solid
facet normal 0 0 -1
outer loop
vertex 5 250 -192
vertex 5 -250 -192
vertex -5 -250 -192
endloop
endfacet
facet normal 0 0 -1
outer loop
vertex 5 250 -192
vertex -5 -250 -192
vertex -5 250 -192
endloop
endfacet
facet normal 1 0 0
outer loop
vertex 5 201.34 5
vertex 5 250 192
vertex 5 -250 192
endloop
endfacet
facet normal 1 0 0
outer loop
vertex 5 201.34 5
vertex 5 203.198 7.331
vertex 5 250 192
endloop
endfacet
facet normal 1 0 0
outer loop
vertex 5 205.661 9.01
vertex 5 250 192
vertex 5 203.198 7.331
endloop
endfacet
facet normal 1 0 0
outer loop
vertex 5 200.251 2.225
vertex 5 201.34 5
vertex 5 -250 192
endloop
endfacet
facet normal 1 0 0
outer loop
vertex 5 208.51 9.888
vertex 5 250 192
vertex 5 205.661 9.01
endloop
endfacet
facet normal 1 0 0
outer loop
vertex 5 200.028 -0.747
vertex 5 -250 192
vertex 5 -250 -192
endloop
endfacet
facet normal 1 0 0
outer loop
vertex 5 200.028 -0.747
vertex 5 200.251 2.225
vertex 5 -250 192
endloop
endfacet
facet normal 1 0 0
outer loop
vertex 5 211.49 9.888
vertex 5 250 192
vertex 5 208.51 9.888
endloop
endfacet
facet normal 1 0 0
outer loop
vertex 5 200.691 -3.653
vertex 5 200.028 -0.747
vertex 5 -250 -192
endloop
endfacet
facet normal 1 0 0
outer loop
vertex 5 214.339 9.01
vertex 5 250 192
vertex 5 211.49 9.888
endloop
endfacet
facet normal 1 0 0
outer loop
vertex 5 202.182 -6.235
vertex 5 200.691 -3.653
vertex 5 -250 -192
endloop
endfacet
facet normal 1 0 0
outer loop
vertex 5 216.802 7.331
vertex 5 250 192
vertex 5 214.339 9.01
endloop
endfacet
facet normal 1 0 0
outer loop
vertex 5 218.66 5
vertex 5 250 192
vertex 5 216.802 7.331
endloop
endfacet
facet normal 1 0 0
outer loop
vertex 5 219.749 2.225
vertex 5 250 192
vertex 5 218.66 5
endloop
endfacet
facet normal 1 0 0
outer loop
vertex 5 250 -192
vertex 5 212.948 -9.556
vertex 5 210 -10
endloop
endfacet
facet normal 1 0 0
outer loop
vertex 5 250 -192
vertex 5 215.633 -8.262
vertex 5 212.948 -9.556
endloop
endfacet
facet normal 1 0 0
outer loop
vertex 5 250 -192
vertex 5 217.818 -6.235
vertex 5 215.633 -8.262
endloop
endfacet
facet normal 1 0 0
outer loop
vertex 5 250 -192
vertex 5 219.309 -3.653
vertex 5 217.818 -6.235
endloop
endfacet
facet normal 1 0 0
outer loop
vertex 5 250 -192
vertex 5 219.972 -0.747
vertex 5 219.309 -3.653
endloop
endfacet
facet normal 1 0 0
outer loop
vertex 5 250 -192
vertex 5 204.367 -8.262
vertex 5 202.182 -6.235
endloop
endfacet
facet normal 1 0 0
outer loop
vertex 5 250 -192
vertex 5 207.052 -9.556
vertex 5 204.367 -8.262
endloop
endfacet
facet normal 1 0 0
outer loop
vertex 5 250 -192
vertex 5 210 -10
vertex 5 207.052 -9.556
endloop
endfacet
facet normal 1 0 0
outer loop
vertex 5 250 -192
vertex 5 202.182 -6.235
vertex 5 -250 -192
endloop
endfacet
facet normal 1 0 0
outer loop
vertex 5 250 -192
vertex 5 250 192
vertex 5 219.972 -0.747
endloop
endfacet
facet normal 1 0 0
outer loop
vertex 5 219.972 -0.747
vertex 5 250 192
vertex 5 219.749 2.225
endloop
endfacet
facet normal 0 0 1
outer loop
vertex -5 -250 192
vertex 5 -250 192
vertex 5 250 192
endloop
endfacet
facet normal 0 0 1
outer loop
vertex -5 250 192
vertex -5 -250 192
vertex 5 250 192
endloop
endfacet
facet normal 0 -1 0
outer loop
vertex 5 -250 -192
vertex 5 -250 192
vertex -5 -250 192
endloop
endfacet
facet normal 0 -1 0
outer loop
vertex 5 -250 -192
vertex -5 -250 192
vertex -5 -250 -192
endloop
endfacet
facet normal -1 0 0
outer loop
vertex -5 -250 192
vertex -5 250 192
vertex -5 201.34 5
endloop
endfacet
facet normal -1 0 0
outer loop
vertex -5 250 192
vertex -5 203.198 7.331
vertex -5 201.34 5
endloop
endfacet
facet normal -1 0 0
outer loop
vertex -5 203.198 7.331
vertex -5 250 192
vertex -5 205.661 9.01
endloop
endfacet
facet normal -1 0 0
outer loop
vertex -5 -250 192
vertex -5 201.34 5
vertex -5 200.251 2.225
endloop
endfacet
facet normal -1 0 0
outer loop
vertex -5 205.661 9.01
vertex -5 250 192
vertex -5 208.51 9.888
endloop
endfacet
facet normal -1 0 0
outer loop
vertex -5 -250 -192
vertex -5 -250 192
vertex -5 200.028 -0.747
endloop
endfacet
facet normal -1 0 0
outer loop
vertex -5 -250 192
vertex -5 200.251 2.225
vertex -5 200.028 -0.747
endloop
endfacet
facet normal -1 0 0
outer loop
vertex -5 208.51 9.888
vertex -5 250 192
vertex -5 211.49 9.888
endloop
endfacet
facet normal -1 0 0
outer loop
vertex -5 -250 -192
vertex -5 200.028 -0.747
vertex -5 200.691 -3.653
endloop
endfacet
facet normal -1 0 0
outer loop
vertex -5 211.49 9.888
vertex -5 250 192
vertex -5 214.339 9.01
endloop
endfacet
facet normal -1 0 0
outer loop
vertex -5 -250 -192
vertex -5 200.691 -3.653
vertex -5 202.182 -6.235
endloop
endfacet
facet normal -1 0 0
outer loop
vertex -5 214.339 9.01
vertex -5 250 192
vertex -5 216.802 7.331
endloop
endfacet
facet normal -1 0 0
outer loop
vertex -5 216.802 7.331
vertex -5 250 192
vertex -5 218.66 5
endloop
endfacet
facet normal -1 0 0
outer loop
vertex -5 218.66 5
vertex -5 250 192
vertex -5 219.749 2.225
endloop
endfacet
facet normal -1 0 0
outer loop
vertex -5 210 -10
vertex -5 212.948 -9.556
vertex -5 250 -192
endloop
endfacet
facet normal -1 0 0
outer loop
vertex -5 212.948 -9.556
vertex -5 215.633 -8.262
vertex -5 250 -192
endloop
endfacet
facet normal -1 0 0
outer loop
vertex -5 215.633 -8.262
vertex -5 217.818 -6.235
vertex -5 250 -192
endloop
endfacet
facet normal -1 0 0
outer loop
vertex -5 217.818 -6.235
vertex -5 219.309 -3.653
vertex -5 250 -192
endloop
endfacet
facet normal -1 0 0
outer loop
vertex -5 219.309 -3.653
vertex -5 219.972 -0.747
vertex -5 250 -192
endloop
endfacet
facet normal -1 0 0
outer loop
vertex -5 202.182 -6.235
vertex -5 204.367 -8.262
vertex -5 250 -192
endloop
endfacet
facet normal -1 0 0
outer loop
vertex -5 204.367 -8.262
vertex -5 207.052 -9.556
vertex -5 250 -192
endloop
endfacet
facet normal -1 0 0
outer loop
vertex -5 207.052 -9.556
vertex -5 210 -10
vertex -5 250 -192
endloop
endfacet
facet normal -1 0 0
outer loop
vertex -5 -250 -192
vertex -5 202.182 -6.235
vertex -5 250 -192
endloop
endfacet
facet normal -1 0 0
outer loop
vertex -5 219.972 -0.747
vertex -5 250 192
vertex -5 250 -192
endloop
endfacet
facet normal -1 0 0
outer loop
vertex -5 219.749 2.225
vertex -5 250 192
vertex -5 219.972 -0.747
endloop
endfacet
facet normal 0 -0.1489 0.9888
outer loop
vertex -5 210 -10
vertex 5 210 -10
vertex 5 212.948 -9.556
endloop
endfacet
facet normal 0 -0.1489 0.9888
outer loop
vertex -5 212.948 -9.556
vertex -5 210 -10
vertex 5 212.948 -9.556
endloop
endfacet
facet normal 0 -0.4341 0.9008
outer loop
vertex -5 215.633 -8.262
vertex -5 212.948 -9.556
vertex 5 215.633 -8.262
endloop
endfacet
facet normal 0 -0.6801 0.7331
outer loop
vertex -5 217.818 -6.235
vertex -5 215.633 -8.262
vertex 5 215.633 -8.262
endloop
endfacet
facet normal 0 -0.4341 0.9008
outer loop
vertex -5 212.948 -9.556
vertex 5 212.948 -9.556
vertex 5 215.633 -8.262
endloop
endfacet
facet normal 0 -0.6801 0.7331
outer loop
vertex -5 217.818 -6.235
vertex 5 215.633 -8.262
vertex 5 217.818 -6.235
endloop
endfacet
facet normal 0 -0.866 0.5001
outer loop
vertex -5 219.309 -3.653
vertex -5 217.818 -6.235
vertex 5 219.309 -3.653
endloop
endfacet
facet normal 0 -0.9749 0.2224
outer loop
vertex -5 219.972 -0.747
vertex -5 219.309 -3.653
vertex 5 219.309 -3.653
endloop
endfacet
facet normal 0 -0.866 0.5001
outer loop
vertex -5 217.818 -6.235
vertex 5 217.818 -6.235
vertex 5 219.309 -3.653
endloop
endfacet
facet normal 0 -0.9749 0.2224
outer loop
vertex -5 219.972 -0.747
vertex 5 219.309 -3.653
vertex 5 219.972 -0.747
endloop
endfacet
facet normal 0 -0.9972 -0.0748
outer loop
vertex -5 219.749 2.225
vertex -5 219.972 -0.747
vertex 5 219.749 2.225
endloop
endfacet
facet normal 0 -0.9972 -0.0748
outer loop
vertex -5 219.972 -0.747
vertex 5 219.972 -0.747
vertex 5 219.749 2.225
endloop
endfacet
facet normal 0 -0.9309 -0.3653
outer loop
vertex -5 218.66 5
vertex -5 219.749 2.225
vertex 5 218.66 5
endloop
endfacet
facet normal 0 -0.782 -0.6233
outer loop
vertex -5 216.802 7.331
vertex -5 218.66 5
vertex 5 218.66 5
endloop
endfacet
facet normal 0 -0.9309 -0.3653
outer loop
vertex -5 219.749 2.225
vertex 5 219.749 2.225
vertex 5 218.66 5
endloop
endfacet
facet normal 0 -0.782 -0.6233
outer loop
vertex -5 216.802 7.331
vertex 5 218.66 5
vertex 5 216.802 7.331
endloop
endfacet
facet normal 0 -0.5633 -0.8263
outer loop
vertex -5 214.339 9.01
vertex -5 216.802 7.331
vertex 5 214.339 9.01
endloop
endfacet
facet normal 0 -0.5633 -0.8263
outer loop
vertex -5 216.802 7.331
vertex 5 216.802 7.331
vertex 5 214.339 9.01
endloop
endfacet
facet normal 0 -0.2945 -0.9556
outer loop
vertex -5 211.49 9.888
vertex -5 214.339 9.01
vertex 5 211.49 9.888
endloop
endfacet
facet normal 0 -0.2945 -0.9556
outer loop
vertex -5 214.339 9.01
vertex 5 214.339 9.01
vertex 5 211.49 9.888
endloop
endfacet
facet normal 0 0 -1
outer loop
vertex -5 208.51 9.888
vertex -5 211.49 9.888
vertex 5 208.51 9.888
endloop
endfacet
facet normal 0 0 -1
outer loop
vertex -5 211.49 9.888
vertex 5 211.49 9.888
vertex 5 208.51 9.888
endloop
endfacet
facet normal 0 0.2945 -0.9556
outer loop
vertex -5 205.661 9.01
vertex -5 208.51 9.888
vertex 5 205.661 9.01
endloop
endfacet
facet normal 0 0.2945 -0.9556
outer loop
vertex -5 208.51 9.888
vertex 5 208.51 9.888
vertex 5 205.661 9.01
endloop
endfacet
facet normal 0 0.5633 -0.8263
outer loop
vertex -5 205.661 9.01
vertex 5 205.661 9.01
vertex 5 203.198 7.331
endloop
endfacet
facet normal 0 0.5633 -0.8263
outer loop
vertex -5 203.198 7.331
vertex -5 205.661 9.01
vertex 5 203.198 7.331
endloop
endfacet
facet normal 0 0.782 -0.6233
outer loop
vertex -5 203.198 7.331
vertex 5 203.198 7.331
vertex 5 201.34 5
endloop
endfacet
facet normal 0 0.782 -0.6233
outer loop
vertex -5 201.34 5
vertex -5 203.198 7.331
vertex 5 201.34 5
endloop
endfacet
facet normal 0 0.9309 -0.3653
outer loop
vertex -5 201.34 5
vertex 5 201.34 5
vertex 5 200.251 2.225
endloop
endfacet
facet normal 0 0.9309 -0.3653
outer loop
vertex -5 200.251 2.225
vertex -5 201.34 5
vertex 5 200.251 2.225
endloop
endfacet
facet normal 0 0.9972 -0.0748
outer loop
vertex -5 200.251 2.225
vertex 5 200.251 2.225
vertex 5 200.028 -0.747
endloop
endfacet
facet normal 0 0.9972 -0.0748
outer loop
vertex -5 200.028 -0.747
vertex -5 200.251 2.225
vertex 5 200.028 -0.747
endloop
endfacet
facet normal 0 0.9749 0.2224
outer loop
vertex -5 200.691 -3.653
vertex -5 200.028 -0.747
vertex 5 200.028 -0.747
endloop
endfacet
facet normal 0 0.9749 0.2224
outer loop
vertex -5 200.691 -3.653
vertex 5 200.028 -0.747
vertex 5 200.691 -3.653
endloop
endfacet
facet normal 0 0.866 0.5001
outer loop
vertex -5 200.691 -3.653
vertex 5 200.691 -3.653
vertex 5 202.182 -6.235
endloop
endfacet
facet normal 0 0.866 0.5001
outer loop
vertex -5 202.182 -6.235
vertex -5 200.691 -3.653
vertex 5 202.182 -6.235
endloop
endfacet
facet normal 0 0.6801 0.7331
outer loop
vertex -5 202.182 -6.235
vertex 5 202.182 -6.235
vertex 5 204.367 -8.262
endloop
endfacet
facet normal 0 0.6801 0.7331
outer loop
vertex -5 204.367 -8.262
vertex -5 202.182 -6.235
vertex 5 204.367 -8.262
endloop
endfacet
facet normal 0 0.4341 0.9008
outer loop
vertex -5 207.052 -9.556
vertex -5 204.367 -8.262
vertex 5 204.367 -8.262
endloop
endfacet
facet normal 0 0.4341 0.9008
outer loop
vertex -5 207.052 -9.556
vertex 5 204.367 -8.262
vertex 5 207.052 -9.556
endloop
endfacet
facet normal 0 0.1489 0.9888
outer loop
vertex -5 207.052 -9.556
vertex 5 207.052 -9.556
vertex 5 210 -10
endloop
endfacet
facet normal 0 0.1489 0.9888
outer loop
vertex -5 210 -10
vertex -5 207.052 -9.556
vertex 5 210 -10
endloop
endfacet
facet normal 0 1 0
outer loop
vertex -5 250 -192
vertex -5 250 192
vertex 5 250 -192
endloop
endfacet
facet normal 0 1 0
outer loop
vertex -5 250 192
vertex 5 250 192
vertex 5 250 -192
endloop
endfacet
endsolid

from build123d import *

# Parameters (mm, degrees)
SKETCH1_W           = 384
SKETCH1_H           = 500
BOSS_EXTRUDE1_DEPTH = 5
SKETCH2_R           = 10
CUT_EXTRUDE1_DEPTH  = 316.379136913


with BuildPart() as part:
    # Sketch1 → Boss-Extrude1 (new, symmetric)
    with BuildSketch(Plane(origin=(0, 0, 0), x_dir=(0, 0, -1), z_dir=(1, 0, 0))):
        Rectangle(SKETCH1_W, SKETCH1_H)
    extrude(amount=BOSS_EXTRUDE1_DEPTH, both=True)

    # Sketch2 → Cut-Extrude1 (cut, through all)
    with BuildSketch(Plane(origin=(5, 0, 0), x_dir=(0, 0, -1), z_dir=(1, 0, 0))):
        with Locations((0, 210)):
            Circle(SKETCH2_R)
    extrude(amount=-CUT_EXTRUDE1_DEPTH, mode=Mode.SUBTRACT)


solid = part.part
